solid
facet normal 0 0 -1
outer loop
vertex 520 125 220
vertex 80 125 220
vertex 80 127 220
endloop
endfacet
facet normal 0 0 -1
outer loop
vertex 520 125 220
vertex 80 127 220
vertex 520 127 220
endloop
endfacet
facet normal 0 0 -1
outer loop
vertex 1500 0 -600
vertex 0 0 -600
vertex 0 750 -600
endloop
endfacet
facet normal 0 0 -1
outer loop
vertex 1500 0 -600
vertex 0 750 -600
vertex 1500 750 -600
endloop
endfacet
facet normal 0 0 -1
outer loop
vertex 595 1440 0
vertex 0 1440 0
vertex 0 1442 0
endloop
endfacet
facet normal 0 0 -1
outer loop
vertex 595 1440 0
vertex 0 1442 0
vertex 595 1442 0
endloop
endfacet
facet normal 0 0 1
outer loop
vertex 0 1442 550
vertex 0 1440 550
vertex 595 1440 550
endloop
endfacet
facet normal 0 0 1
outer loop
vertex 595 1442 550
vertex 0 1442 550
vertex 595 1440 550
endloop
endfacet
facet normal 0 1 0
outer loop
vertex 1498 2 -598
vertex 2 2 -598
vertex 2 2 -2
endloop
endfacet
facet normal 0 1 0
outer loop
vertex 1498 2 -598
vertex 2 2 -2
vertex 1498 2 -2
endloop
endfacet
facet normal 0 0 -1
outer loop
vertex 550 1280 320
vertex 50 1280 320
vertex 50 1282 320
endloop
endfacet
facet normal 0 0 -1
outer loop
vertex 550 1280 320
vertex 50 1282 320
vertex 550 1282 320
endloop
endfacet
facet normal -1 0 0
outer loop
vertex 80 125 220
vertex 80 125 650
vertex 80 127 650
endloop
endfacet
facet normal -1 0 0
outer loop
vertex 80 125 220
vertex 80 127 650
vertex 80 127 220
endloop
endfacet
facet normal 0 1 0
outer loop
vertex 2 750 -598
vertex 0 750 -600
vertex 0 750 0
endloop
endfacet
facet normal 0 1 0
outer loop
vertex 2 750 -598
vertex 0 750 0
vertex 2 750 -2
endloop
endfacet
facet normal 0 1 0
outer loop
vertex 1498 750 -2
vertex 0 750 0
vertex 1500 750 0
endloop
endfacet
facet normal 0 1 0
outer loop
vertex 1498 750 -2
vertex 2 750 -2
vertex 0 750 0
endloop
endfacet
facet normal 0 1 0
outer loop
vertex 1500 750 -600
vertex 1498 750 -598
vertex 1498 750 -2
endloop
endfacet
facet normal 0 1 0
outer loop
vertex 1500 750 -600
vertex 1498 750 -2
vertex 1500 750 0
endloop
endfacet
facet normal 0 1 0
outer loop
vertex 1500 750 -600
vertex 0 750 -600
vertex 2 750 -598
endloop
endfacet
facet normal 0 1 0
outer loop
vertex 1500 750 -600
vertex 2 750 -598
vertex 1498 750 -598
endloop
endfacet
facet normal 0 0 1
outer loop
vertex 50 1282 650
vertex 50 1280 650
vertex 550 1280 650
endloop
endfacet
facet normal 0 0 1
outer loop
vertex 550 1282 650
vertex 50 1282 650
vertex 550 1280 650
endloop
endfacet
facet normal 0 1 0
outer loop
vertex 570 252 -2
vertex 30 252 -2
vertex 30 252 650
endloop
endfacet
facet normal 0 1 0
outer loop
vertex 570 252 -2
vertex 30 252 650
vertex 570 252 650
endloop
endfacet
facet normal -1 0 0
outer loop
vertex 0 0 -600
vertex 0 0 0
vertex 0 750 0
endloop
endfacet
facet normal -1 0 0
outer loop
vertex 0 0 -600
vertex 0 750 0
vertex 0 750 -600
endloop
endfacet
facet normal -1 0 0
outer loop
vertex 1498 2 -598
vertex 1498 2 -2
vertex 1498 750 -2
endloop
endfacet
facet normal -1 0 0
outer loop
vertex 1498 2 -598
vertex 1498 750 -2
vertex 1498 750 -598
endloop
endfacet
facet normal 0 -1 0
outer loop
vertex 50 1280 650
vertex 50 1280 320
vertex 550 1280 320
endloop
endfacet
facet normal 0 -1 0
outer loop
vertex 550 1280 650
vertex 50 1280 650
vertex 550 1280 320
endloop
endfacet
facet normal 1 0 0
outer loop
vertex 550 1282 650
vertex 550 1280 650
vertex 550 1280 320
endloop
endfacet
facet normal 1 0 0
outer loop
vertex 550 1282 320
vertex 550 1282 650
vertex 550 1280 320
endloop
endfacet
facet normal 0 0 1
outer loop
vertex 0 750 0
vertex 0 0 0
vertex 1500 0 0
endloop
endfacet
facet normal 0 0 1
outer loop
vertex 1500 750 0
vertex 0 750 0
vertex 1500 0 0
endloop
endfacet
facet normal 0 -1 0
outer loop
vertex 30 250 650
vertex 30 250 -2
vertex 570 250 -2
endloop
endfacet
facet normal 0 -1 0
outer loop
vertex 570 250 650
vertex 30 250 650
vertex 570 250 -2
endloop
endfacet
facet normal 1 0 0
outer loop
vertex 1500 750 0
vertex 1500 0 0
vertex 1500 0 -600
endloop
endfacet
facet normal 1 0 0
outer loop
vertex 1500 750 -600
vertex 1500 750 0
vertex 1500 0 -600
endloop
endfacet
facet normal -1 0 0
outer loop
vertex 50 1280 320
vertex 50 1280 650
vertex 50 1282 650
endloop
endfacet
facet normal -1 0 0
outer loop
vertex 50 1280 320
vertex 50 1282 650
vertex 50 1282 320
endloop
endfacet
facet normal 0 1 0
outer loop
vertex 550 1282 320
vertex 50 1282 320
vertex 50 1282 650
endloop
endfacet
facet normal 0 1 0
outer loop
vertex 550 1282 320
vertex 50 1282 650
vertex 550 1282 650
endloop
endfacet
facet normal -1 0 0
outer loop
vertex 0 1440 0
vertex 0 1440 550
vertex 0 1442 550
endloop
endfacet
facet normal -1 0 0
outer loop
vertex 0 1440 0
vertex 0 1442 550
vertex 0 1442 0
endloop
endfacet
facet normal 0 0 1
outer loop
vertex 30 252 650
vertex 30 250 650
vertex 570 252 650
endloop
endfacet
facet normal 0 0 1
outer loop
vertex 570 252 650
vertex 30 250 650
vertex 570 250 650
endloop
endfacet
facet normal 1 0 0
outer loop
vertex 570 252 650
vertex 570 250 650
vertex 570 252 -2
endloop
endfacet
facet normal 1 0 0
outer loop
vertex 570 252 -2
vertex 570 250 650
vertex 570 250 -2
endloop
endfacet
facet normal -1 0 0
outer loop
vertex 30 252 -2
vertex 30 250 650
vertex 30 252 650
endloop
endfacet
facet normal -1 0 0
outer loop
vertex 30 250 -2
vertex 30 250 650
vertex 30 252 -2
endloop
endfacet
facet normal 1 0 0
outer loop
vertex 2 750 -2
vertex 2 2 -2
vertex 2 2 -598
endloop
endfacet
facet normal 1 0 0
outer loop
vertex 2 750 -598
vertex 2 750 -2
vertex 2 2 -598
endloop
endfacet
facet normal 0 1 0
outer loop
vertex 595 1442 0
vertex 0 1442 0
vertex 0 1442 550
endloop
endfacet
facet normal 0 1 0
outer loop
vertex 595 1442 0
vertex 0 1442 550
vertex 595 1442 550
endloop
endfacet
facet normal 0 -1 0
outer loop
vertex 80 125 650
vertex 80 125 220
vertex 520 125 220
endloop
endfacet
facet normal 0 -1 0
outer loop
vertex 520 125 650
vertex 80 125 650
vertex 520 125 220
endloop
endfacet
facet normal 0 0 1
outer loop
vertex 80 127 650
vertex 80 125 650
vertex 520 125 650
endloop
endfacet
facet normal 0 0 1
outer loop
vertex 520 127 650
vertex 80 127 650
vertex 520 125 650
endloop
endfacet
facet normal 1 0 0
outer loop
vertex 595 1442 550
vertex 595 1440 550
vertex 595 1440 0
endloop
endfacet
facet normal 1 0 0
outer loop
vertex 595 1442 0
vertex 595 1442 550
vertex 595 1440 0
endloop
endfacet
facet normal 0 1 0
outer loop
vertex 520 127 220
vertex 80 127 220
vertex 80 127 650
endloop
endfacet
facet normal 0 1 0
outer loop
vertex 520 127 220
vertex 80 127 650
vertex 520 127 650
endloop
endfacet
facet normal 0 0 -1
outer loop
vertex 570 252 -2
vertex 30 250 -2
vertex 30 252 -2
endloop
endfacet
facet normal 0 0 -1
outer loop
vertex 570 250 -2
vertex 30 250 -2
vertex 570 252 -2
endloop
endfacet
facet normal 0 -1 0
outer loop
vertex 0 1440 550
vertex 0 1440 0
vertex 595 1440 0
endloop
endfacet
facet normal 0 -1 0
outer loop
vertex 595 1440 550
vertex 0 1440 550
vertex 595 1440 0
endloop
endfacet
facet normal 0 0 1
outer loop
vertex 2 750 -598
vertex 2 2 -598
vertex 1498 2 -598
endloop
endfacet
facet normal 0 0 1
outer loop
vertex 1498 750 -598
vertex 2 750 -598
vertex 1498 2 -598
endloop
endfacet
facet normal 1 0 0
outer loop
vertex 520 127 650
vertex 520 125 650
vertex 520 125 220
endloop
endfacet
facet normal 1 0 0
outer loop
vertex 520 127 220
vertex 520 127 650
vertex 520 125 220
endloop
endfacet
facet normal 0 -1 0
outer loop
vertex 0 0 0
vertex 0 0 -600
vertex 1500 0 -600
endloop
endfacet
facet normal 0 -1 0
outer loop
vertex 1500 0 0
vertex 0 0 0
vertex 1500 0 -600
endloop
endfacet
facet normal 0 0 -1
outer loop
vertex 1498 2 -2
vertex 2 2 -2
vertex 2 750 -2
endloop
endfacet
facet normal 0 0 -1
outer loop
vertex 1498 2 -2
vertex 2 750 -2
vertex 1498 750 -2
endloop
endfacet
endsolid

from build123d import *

# Parameters (mm, degrees)
MASTER_FOOTPRINT_W            = 1500
MASTER_FOOTPRINT_H            = 600
BATH_BASE_PLATE_DEPTH         = 750
BATH_SHELL_2MM_T              = -2
INLET_IMPACT_BAFFLE_START     = 125
SKETCH_1_W                    = 440
SKETCH_1_H                    = 430
INLET_IMPACT_BAFFLE_DEPTH     = 2
OUTLET_SUBMERGED_BAFFLE_START = 1280
SKETCH_3_W                    = 500
SKETCH_3_H                    = 330
OUTLET_SUBMERGED_BAFFLE_DEPTH = 2
OVERFLOW_WEIR_Z550_START      = 1440
SKETCH_4_W                    = 595
SKETCH_4_H                    = 550
OVERFLOW_WEIR_Z550_DEPTH      = 2
DISTRIBUTOR_SOLID_PANEL_START = 250
SKETCH_5_W                    = 540
SKETCH_5_H                    = 652
DISTRIBUTOR_SOLID_PANEL_DEPTH = 2


with BuildPart() as part:
    # MASTER_FOOTPRINT → BATH_BASE_PLATE (new body)
    with BuildSketch(Plane(origin=(0, 0, 0), x_dir=(1, 0, 0), z_dir=(0, 1, 0))):
        with Locations((750, 300)):
            Rectangle(MASTER_FOOTPRINT_W, MASTER_FOOTPRINT_H)
    extrude(amount=BATH_BASE_PLATE_DEPTH)

    # BATH_SHELL_2MM
    bath_shell_2mm_openings = [part.faces().sort_by_distance(p)[0] for p in [
        (750, 750, -300),
    ]]
    offset(amount=BATH_SHELL_2MM_T, openings=bath_shell_2mm_openings, kind=Kind.INTERSECTION)


with BuildPart() as body_2:
    # Эскиз1 → INLET_IMPACT_BAFFLE (new body)
    with BuildSketch(Plane(origin=(0, 0, 0), x_dir=(1, 0, 0), z_dir=(0, 1, 0)).offset(INLET_IMPACT_BAFFLE_START)):
        with Locations((300, -435)):
            Rectangle(SKETCH_1_W, SKETCH_1_H)
    extrude(amount=INLET_IMPACT_BAFFLE_DEPTH)


with BuildPart() as body_3:
    # Эскиз3 → OUTLET_SUBMERGED_BAFFLE (new body)
    with BuildSketch(Plane(origin=(0, 0, 0), x_dir=(1, 0, 0), z_dir=(0, 1, 0)).offset(OUTLET_SUBMERGED_BAFFLE_START)):
        with Locations((300, -485)):
            Rectangle(SKETCH_3_W, SKETCH_3_H)
    extrude(amount=OUTLET_SUBMERGED_BAFFLE_DEPTH)


with BuildPart() as body_4:
    # Эскиз4 → OVERFLOW_WEIR_Z550 (new body)
    with BuildSketch(Plane(origin=(0, 0, 0), x_dir=(1, 0, 0), z_dir=(0, 1, 0)).offset(OVERFLOW_WEIR_Z550_START)):
        with Locations((297.5, -275)):
            Rectangle(SKETCH_4_W, SKETCH_4_H)
    extrude(amount=OVERFLOW_WEIR_Z550_DEPTH)


with BuildPart() as body_5:
    # Эскиз5 → DISTRIBUTOR_SOLID_PANEL (new body)
    with BuildSketch(Plane(origin=(0, 0, 0), x_dir=(1, 0, 0), z_dir=(0, 1, 0)).offset(DISTRIBUTOR_SOLID_PANEL_START)):
        with Locations((300, -324)):
            Rectangle(SKETCH_5_W, SKETCH_5_H)
    extrude(amount=DISTRIBUTOR_SOLID_PANEL_DEPTH)


solid = Compound([part.part, body_2.part, body_3.part, body_4.part, body_5.part])
